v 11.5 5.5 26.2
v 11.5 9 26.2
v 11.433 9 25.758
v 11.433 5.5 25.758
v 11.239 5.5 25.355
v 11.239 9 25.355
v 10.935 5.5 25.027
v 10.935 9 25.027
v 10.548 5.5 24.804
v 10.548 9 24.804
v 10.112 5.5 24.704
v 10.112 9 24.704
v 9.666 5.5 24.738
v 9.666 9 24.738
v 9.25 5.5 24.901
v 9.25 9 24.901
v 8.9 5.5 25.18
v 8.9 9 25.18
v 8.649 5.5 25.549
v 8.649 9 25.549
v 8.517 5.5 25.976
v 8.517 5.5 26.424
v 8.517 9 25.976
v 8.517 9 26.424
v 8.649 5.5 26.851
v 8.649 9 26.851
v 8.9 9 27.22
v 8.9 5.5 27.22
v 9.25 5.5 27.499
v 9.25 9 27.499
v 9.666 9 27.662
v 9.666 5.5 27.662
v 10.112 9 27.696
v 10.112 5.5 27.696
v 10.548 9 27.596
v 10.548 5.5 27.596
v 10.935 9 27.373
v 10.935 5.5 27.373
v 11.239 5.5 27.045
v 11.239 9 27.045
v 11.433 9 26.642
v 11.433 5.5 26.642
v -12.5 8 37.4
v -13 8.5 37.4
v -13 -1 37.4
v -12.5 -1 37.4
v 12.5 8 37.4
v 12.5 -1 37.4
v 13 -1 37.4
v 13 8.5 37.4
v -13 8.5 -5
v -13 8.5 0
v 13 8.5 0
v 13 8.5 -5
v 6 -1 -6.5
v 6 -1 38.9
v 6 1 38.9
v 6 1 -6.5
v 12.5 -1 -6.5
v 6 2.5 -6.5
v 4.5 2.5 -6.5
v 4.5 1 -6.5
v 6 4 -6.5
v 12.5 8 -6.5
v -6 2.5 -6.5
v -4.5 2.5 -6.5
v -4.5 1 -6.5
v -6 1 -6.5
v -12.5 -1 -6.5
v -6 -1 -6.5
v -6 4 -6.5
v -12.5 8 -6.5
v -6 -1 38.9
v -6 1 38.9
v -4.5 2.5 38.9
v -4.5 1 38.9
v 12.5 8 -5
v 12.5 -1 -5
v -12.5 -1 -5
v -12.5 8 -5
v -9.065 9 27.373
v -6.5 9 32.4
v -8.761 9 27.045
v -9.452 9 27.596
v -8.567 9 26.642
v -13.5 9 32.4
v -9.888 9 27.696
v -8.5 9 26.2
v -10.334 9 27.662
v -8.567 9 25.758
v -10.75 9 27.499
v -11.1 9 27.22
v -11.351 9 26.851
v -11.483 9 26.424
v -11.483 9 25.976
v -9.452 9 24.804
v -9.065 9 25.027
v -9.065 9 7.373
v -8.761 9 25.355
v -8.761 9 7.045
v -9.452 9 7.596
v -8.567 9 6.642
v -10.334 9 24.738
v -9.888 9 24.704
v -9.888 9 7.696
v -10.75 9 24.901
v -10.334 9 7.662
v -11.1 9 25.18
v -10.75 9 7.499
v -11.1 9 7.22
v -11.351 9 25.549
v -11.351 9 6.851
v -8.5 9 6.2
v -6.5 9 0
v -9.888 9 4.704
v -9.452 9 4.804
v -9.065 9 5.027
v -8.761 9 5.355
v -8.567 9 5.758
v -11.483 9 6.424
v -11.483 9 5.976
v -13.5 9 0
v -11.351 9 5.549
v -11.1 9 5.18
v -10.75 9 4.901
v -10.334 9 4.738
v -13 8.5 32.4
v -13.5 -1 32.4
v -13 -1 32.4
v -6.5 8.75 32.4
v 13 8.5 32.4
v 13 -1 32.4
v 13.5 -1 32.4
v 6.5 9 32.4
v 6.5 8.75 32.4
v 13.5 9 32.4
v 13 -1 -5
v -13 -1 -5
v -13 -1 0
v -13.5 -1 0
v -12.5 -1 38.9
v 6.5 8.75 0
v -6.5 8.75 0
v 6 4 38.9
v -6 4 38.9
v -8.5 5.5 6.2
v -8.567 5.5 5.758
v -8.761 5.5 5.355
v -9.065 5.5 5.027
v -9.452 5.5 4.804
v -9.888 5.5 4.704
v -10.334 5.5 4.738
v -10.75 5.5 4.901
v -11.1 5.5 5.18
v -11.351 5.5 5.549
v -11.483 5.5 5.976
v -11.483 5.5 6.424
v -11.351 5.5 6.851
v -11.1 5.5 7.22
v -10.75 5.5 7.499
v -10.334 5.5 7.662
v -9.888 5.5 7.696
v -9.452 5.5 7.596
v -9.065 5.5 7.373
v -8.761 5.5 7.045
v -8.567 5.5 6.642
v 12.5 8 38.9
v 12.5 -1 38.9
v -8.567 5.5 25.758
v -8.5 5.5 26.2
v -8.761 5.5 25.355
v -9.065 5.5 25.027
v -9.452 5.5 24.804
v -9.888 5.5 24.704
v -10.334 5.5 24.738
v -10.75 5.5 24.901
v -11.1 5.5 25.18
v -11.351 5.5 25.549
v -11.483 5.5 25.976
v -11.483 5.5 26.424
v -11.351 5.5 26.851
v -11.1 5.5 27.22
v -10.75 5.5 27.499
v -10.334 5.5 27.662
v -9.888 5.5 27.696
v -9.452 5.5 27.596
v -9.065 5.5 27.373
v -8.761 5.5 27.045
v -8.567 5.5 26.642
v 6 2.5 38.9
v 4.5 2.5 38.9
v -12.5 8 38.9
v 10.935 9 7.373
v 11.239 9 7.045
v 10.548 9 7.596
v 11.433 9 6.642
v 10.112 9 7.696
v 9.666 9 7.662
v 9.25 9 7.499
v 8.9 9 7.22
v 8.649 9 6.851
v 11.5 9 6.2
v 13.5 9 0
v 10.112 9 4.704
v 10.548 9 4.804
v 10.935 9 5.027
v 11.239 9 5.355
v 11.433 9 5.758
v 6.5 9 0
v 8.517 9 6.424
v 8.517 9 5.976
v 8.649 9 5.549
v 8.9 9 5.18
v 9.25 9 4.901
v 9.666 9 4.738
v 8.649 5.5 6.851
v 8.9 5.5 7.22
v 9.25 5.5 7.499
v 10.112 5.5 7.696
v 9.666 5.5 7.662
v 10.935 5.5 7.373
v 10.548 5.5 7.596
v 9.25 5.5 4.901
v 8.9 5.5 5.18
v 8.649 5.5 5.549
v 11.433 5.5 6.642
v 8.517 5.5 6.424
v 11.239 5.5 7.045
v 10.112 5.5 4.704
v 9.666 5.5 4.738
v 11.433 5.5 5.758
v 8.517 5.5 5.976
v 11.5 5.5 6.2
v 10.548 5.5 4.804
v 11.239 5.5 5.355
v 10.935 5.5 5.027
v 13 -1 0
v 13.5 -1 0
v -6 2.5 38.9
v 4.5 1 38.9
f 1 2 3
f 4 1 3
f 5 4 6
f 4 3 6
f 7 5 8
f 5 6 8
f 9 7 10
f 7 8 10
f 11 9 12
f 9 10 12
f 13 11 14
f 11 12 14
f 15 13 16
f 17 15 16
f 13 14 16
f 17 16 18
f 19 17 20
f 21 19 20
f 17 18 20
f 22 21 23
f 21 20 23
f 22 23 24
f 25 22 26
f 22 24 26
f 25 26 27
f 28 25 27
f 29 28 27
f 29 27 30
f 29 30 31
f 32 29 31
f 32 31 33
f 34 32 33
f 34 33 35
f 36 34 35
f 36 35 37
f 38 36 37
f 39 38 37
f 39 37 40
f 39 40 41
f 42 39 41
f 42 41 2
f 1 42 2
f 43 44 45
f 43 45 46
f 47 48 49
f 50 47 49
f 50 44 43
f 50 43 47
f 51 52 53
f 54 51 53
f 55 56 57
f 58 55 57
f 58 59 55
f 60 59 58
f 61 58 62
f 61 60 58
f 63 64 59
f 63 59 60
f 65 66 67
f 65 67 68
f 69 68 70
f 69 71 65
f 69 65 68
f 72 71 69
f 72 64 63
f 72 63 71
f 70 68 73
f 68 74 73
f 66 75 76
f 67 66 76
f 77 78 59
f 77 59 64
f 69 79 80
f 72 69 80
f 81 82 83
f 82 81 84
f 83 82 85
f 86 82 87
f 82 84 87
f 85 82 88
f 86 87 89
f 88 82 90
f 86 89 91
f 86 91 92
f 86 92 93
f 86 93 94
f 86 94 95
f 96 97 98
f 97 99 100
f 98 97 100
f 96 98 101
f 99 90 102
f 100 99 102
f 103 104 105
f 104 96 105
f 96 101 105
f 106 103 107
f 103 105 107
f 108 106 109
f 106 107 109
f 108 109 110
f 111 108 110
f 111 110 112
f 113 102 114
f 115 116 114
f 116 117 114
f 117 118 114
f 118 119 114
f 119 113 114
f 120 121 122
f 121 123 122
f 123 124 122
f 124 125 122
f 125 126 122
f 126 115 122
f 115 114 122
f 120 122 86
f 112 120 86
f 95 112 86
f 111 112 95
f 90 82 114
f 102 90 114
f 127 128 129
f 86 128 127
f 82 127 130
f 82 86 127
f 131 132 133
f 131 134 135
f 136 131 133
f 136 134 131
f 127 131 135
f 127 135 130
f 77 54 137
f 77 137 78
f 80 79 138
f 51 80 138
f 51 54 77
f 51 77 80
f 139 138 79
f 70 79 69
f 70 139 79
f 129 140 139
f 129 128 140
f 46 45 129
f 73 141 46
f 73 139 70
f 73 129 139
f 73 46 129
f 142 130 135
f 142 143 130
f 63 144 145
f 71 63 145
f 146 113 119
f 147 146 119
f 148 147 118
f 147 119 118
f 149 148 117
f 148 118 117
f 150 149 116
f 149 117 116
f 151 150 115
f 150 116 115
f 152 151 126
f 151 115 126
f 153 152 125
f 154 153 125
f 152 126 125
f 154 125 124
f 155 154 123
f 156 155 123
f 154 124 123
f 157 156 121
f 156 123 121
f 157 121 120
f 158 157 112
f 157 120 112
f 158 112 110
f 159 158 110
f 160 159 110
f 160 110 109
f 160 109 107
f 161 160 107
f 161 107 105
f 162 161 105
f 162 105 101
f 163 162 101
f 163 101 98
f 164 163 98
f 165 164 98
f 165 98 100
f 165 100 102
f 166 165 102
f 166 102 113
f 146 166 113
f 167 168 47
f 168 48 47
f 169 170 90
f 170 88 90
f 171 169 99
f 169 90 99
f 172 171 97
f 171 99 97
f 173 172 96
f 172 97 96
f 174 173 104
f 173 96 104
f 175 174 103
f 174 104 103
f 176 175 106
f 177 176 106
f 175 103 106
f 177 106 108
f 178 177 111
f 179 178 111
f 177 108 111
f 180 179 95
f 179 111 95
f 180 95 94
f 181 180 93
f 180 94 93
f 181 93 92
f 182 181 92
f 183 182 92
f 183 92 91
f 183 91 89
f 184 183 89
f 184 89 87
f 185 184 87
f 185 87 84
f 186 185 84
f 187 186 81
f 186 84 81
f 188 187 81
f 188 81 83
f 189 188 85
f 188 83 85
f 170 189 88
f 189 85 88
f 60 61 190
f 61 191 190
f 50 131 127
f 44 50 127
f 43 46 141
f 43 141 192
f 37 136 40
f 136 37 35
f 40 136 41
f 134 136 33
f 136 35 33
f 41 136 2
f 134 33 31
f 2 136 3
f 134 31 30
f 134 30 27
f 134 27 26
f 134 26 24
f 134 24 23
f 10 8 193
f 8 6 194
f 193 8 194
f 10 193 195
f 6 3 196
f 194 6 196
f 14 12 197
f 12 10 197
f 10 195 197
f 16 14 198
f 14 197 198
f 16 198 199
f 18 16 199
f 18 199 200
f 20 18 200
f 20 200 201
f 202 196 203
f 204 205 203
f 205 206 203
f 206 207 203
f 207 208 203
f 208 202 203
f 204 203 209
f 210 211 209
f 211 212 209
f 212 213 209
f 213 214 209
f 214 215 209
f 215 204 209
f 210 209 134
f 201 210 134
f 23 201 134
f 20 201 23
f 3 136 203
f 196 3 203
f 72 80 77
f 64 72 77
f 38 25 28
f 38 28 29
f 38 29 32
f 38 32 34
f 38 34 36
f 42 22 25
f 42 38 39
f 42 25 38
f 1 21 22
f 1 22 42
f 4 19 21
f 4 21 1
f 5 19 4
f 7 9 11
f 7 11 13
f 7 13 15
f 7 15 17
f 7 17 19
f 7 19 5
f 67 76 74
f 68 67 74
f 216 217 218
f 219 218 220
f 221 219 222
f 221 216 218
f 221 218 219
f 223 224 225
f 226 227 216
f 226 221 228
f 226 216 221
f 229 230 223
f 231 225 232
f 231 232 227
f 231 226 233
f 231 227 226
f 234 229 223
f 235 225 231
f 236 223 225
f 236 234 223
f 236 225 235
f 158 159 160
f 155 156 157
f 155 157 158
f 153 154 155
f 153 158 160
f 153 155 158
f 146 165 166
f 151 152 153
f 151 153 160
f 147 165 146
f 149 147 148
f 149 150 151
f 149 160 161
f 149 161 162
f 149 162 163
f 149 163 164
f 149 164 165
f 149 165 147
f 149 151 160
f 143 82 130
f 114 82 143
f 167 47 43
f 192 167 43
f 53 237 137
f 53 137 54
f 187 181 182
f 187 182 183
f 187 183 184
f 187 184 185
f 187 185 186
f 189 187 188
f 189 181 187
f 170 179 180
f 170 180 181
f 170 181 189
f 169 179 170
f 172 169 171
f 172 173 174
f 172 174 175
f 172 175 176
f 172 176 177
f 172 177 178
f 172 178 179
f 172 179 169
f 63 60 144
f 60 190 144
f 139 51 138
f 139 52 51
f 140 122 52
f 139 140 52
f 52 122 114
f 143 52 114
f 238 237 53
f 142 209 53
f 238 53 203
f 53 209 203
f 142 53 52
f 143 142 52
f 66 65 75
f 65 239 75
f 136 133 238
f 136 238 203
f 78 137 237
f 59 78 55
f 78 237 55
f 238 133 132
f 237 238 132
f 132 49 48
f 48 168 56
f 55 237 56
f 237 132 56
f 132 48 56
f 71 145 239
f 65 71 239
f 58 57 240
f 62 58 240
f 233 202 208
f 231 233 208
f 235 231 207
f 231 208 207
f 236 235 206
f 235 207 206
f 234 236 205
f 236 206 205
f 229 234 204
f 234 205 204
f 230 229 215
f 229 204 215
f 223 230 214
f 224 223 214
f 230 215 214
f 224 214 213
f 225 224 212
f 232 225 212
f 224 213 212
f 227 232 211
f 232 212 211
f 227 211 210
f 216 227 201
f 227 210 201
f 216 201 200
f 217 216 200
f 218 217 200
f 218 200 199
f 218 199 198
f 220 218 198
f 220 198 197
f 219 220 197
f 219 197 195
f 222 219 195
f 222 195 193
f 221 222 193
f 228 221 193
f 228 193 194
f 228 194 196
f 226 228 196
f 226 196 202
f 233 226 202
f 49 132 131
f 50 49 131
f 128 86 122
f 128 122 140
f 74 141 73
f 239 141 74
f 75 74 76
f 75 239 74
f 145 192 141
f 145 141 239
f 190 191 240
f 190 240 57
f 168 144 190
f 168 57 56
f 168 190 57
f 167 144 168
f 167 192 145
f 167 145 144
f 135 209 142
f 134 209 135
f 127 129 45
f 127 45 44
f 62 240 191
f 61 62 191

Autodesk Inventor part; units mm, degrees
ref_plane "YZ Plane" through (0, 0, 0) normal (1, 0, 0) x (0, 1, 0)
ref_plane "XZ Plane" through (0, 0, 0) normal (0, 1, 0) x (-1, 0, 0)
ref_plane "XY Plane" through (0, 0, 0) normal (0, 0, 1) x (1, 0, 0)
sketch "Szkic1" plane through (0, 0, 0) normal (0, 0, 1) x (1, 0, 0)
  line L0 (6, 4) -> (-6, 4)
  line L1 (-6, 4) -> (-6, 2.5)
  line L2 (-6, 2.5) -> (-4.5, 2.5)
  line L3 (-4.5, 2.5) -> (-4.5, 1)
  line L4 (-4.5, 1) -> (-6, 1)
  line L5 (-6, 4) -> (-6, 2.5)
  line L6 (-6, 1) -> (-6, -1)
  line L7 (6, 4) -> (6, 2.5)
  line L8 (6, 2.5) -> (4.5, 2.5)
  line L9 (4.5, 2.5) -> (4.5, 1)
  line L10 (4.5, 1) -> (6, 1)
  line L11 (6, -1) -> (6, 1)
  line L12 (6, 2.5) -> (6, 4)
  line L13 (0, 9) -> (-13.5, 9)
  line L14 (0, 9) -> (13.5, 9)
  line L15 (-13.5, 9) -> (-13.5, -1)
  line L16 (13.5, -1) -> (13.5, 9)
  line L17 (-13.5, -1) -> (-6, -1)
  line L18 (6, -1) -> (13.5, -1)
  point P0 (0, 0)
  point P1 (0, 0)
extrude "Wyciągnięcie proste1" add sketch "Szkic1" along normal blind 32.4
sketch "Szkic2" plane through (-13.5, 9, 0) normal (0, 1, 0) x (1, 0, 0)
  line L0 (27, 0) -> (0, 0) projected
  line L1 (0, 0) -> (0, -32.4) projected
  line L2 (27, -32.4) -> (0, -32.4) projected
  line L3 (27, 0) -> (27, -32.4) projected
  line L4 (0, 0) -> (0, -32.4) projected
  line L5 (27, -32.4) -> (0, 0)
  line L6 (0, -32.4) -> (27, 0)
  line L7 (13.5, -6.2) -> (5, -6.2)
  line L8 (3.5, -7.7) -> (3.5, -24.7)
  line L9 (5, -26.2) -> (22, -26.2)
  line L10 (23.5, -24.7) -> (23.5, -7.7)
  line L11 (22, -6.2) -> (13.5, -6.2)
  circle A0 centre (3.5, -26.2) radius 1.5
  circle A1 centre (3.5, -6.2) radius 1.5
  circle A2 centre (23.5, -26.2) radius 1.5
  circle A3 centre (23.5, -6.2) radius 1.5
  point P0 (13.5, 0)
  dimension "d12" = 3
  dimension "d13" = 3
  dimension "d14" = 3
  dimension "d15" = 3
extrude "Wyciągnięcie proste2" cut sketch "Szkic2" against normal blind 3.5 contours A3 L6 | L6 A3 | A1 L5 | L5 A1 | A2 L5 | L5 A2 | A0 L6 | L6 A0
thread "Gwint1" size "M3x0.5" class "6H" standard "ANSI Metric M Profile" full length
thread "Gwint2" size "M3x0.5" class "6H" standard "ANSI Metric M Profile" full length
thread "Gwint3" size "M3x0.5" class "6H" standard "ANSI Metric M Profile" full length
thread "Gwint4" size "M3x0.5" class "6H" standard "ANSI Metric M Profile" full length
sketch "Szkic3" plane through (0, 0, 32.4) normal (0, 0, 1) x (1, 0, 0)
  line L0 (6, 4) -> (6, 2.5) projected
  line L1 (6, 2.5) -> (4.5, 2.5) projected
  line L2 (4.5, 2.5) -> (4.5, 1) projected
  line L3 (4.5, 1) -> (6, 1) projected
  line L4 (6, 1) -> (6, -1) projected
  line L5 (6, -1) -> (13.5, -1) projected
  line L6 (13.5, -1) -> (13.5, 9) projected
  line L7 (13.5, 9) -> (-13.5, 9) projected
  line L8 (-13.5, 9) -> (-13.5, -1) projected
  line L9 (-13.5, -1) -> (-6, -1) projected
  line L10 (-6, -1) -> (-6, 1) projected
  line L11 (-6, 1) -> (-4.5, 1) projected
  line L12 (-4.5, 1) -> (-4.5, 2.5) projected
  line L13 (-4.5, 2.5) -> (-6, 2.5) projected
  line L14 (-6, 2.5) -> (-6, 4) projected
  line L15 (-6, 4) -> (6, 4) projected
  line L16 (-13.5, -1) -> (-13, -1)
  line L17 (-13.5, -1) -> (-6, -1) projected
  line L18 (-13, -1) -> (-13, 8.5)
  line L19 (13.5, -1) -> (13, -1)
  line L20 (6, -1) -> (13.5, -1) projected
  line L21 (13, -1) -> (13, 8.5)
  line L22 (13, 8.5) -> (-13, 8.5)
  point P0 (0, 0)
  dimension "d26" = 0.5
  dimension "d27" = 0.5
extrude "Wyciągnięcie proste3" add sketch "Szkic3" along normal blind 5 contours L15 L14 L13 L12 L11 L10 L9 L18 L22 L21 L5 L4 L3 L2 L1 L0
sketch "Szkic4" plane through (0, 0, 37.4) normal (0, 0, 1) x (1, 0, 0)
  line L0 (6, 4) -> (6, 2.5) projected
  line L1 (6, 2.5) -> (4.5, 2.5) projected
  line L2 (4.5, 2.5) -> (4.5, 1) projected
  line L3 (4.5, 1) -> (6, 1) projected
  line L4 (6, 1) -> (6, -1) projected
  line L5 (6, -1) -> (13, -1) projected
  line L6 (13, -1) -> (13, 8.5) projected
  line L7 (13, 8.5) -> (-13, 8.5) projected
  line L8 (-13, 8.5) -> (-13, -1) projected
  line L9 (-13, -1) -> (-6, -1) projected
  line L10 (-6, -1) -> (-6, 1) projected
  line L11 (-6, 1) -> (-4.5, 1) projected
  line L12 (-4.5, 1) -> (-4.5, 2.5) projected
  line L13 (-4.5, 2.5) -> (-6, 2.5) projected
  line L14 (-6, 2.5) -> (-6, 4) projected
  line L15 (-6, 4) -> (6, 4) projected
  line L16 (-13, -1) -> (-12.5, -1)
  line L17 (-13.5, -1) -> (-6, -1) projected
  line L18 (-12.5, -1) -> (-12.5, 8)
  line L19 (13, -1) -> (12.5, -1)
  line L20 (6, -1) -> (13.5, -1) projected
  line L21 (12.5, -1) -> (12.5, 8)
  line L22 (12.5, 8) -> (-12.5, 8)
  point P0 (0, 0)
extrude "Wyciągnięcie proste4" add sketch "Szkic4" along normal blind 1.5 contours L15 L14 L13 L12 L11 L10 L9 L18 L22 L21 L5 L4 L3 L2 L1 L0
sketch "Szkic5" plane through (0, 0, 0) normal (0, 0, -1) x (-1, 0, 0)
  line L0 (-6, -1) -> (-13, -1)
  line L1 (-6, 4) -> (-6, 2.5)
  line L2 (6, 4) -> (-6, 4)
  line L3 (6, 2.5) -> (6, 4)
  line L4 (4.5, 2.5) -> (6, 2.5)
  line L5 (4.5, 1) -> (4.5, 2.5)
  line L6 (6, 1) -> (4.5, 1)
  line L7 (6, -1) -> (6, 1)
  line L8 (-6, -1) -> (-13, -1)
  line L9 (-6, 1) -> (-6, -1)
  line L10 (-4.5, 1) -> (-6, 1)
  line L11 (-4.5, 2.5) -> (-4.5, 1)
  line L12 (-6, 2.5) -> (-4.5, 2.5)
  line L13 (13.5, -1) -> (6, -1) projected
  line L14 (6, -1) -> (13, -1)
  line L15 (-6, 4) -> (-6, 2.5) projected
  line L16 (6, 4) -> (-6, 4) projected
  line L17 (6, 2.5) -> (6, 4) projected
  line L18 (4.5, 2.5) -> (6, 2.5) projected
  line L19 (4.5, 1) -> (4.5, 2.5) projected
  line L20 (6, 1) -> (4.5, 1) projected
  line L21 (6, -1) -> (6, 1) projected
  line L22 (13.5, -1) -> (6, -1) projected
  line L23 (13.5, 9) -> (13.5, -1) projected
  line L24 (-13.5, 9) -> (13.5, 9) projected
  line L25 (-13.5, -1) -> (-13.5, 9) projected
  line L26 (-6, -1) -> (-13.5, -1) projected
  line L27 (-6, 1) -> (-6, -1) projected
  line L28 (-4.5, 1) -> (-6, 1) projected
  line L29 (-4.5, 2.5) -> (-4.5, 1) projected
  line L30 (-6, 2.5) -> (-4.5, 2.5) projected
  line L31 (-13.5, -1) -> (-13.5, 9) projected
  line L32 (-13.5, 9) -> (-13, 9)
  line L33 (-13, -1) -> (-13, 8.5) projected
  line L34 (-13, 9) -> (-13, -1)
  line L35 (13.5, 9) -> (13, 9)
  line L36 (-13.5, 9) -> (13.5, 9) projected
  line L37 (13, 9) -> (13, -1)
  line L38 (-13, 9) -> (-13, 8.5)
  line L39 (13, 8.5) -> (-13, 8.5) projected
  line L40 (-13, 8.5) -> (13, 8.5)
  point P0 (0, 0)
  dimension "d45" = 0.5
  dimension "d46" = 0.5
  dimension "d47" = 0.5
  dimension "d49" = 26
extrude "Wyciągnięcie proste5" add sketch "Szkic5" along normal blind 5 contours L0 L33 L39 L37 L13 L7 L6 L5 L4 L3 L2 L1 L12 L11 L10 L9
sketch "Szkic7" plane through (0, 0, -5) normal (0, 0, -1) x (-1, 0, 0)
  line L0 (-13, -1) -> (-6, -1)
  line L1 (-6, -1) -> (-6, 1)
  line L2 (-6, 1) -> (-4.5, 1)
  line L3 (-4.5, 1) -> (-4.5, 2.5)
  line L4 (-4.5, 2.5) -> (-6, 2.5)
  line L5 (-6, 2.5) -> (-6, 4)
  line L6 (-6, 4) -> (6, 4)
  line L7 (6, 4) -> (6, 2.5)
  line L8 (6, 2.5) -> (4.5, 2.5)
  line L9 (4.5, 2.5) -> (4.5, 1)
  line L10 (4.5, 1) -> (6, 1)
  line L11 (6, 1) -> (6, -1)
  line L12 (6, -1) -> (13, -1)
  line L13 (-6, -1) -> (-12.5, -1)
  line L14 (-13, -1) -> (-12.5, -1)
  line L15 (-12.5, -1) -> (-12.5, 8)
  line L16 (13, -1) -> (12.5, -1)
  line L17 (6, -1) -> (13, -1)
  line L18 (12.5, -1) -> (12.5, 8)
  line L19 (12.5, 8) -> (12.5, -1)
  line L20 (-12.5, -1) -> (-12.5, 8)
  line L21 (12.5, 8) -> (-12.5, 8)
  point P0 (0, 0)
  dimension "d53" = 25
  dimension "d54" = 9
  dimension "d55" = 9
extrude "Wyciągnięcie proste6" add sketch "Szkic7" along normal blind 1.5
sketch "Szkic8" plane through (-13.5, 9, 0) normal (0, 1, 0) x (1, 0, 0)
  circle A0 centre (23.5, -6.2) radius 1.5 projected
  circle A1 centre (23.5, -26.2) radius 1.5 projected
  circle A2 centre (3.5, -6.2) radius 1.5 projected
  circle A3 centre (3.5, -26.2) radius 1.5 projected
  line L0 (27, 0) -> (0, 0) projected
  line L1 (0, 0) -> (0, -32.4) projected
  line L2 (27, -32.4) -> (0, -32.4) projected
  line L3 (27, 0) -> (27, -32.4) projected
  line L4 (27, 0) -> (27, -32.4) projected
  line L5 (27, 0) -> (20, 0)
  line L6 (20, 0) -> (20, -32.4)
  line L7 (0, -32.4) -> (7, -32.4)
  line L8 (27, -32.4) -> (0, -32.4) projected
  line L9 (7, -32.4) -> (7, 0)
  point P0 (13.5, 0)
  dimension "d58" = 7
  dimension "d59" = 7
extrude "Wyciągnięcie proste7" cut sketch "Szkic8" against normal blind 0.25 contours L6 L2 L9 L0
properties part number "Wózek MGN12H"
